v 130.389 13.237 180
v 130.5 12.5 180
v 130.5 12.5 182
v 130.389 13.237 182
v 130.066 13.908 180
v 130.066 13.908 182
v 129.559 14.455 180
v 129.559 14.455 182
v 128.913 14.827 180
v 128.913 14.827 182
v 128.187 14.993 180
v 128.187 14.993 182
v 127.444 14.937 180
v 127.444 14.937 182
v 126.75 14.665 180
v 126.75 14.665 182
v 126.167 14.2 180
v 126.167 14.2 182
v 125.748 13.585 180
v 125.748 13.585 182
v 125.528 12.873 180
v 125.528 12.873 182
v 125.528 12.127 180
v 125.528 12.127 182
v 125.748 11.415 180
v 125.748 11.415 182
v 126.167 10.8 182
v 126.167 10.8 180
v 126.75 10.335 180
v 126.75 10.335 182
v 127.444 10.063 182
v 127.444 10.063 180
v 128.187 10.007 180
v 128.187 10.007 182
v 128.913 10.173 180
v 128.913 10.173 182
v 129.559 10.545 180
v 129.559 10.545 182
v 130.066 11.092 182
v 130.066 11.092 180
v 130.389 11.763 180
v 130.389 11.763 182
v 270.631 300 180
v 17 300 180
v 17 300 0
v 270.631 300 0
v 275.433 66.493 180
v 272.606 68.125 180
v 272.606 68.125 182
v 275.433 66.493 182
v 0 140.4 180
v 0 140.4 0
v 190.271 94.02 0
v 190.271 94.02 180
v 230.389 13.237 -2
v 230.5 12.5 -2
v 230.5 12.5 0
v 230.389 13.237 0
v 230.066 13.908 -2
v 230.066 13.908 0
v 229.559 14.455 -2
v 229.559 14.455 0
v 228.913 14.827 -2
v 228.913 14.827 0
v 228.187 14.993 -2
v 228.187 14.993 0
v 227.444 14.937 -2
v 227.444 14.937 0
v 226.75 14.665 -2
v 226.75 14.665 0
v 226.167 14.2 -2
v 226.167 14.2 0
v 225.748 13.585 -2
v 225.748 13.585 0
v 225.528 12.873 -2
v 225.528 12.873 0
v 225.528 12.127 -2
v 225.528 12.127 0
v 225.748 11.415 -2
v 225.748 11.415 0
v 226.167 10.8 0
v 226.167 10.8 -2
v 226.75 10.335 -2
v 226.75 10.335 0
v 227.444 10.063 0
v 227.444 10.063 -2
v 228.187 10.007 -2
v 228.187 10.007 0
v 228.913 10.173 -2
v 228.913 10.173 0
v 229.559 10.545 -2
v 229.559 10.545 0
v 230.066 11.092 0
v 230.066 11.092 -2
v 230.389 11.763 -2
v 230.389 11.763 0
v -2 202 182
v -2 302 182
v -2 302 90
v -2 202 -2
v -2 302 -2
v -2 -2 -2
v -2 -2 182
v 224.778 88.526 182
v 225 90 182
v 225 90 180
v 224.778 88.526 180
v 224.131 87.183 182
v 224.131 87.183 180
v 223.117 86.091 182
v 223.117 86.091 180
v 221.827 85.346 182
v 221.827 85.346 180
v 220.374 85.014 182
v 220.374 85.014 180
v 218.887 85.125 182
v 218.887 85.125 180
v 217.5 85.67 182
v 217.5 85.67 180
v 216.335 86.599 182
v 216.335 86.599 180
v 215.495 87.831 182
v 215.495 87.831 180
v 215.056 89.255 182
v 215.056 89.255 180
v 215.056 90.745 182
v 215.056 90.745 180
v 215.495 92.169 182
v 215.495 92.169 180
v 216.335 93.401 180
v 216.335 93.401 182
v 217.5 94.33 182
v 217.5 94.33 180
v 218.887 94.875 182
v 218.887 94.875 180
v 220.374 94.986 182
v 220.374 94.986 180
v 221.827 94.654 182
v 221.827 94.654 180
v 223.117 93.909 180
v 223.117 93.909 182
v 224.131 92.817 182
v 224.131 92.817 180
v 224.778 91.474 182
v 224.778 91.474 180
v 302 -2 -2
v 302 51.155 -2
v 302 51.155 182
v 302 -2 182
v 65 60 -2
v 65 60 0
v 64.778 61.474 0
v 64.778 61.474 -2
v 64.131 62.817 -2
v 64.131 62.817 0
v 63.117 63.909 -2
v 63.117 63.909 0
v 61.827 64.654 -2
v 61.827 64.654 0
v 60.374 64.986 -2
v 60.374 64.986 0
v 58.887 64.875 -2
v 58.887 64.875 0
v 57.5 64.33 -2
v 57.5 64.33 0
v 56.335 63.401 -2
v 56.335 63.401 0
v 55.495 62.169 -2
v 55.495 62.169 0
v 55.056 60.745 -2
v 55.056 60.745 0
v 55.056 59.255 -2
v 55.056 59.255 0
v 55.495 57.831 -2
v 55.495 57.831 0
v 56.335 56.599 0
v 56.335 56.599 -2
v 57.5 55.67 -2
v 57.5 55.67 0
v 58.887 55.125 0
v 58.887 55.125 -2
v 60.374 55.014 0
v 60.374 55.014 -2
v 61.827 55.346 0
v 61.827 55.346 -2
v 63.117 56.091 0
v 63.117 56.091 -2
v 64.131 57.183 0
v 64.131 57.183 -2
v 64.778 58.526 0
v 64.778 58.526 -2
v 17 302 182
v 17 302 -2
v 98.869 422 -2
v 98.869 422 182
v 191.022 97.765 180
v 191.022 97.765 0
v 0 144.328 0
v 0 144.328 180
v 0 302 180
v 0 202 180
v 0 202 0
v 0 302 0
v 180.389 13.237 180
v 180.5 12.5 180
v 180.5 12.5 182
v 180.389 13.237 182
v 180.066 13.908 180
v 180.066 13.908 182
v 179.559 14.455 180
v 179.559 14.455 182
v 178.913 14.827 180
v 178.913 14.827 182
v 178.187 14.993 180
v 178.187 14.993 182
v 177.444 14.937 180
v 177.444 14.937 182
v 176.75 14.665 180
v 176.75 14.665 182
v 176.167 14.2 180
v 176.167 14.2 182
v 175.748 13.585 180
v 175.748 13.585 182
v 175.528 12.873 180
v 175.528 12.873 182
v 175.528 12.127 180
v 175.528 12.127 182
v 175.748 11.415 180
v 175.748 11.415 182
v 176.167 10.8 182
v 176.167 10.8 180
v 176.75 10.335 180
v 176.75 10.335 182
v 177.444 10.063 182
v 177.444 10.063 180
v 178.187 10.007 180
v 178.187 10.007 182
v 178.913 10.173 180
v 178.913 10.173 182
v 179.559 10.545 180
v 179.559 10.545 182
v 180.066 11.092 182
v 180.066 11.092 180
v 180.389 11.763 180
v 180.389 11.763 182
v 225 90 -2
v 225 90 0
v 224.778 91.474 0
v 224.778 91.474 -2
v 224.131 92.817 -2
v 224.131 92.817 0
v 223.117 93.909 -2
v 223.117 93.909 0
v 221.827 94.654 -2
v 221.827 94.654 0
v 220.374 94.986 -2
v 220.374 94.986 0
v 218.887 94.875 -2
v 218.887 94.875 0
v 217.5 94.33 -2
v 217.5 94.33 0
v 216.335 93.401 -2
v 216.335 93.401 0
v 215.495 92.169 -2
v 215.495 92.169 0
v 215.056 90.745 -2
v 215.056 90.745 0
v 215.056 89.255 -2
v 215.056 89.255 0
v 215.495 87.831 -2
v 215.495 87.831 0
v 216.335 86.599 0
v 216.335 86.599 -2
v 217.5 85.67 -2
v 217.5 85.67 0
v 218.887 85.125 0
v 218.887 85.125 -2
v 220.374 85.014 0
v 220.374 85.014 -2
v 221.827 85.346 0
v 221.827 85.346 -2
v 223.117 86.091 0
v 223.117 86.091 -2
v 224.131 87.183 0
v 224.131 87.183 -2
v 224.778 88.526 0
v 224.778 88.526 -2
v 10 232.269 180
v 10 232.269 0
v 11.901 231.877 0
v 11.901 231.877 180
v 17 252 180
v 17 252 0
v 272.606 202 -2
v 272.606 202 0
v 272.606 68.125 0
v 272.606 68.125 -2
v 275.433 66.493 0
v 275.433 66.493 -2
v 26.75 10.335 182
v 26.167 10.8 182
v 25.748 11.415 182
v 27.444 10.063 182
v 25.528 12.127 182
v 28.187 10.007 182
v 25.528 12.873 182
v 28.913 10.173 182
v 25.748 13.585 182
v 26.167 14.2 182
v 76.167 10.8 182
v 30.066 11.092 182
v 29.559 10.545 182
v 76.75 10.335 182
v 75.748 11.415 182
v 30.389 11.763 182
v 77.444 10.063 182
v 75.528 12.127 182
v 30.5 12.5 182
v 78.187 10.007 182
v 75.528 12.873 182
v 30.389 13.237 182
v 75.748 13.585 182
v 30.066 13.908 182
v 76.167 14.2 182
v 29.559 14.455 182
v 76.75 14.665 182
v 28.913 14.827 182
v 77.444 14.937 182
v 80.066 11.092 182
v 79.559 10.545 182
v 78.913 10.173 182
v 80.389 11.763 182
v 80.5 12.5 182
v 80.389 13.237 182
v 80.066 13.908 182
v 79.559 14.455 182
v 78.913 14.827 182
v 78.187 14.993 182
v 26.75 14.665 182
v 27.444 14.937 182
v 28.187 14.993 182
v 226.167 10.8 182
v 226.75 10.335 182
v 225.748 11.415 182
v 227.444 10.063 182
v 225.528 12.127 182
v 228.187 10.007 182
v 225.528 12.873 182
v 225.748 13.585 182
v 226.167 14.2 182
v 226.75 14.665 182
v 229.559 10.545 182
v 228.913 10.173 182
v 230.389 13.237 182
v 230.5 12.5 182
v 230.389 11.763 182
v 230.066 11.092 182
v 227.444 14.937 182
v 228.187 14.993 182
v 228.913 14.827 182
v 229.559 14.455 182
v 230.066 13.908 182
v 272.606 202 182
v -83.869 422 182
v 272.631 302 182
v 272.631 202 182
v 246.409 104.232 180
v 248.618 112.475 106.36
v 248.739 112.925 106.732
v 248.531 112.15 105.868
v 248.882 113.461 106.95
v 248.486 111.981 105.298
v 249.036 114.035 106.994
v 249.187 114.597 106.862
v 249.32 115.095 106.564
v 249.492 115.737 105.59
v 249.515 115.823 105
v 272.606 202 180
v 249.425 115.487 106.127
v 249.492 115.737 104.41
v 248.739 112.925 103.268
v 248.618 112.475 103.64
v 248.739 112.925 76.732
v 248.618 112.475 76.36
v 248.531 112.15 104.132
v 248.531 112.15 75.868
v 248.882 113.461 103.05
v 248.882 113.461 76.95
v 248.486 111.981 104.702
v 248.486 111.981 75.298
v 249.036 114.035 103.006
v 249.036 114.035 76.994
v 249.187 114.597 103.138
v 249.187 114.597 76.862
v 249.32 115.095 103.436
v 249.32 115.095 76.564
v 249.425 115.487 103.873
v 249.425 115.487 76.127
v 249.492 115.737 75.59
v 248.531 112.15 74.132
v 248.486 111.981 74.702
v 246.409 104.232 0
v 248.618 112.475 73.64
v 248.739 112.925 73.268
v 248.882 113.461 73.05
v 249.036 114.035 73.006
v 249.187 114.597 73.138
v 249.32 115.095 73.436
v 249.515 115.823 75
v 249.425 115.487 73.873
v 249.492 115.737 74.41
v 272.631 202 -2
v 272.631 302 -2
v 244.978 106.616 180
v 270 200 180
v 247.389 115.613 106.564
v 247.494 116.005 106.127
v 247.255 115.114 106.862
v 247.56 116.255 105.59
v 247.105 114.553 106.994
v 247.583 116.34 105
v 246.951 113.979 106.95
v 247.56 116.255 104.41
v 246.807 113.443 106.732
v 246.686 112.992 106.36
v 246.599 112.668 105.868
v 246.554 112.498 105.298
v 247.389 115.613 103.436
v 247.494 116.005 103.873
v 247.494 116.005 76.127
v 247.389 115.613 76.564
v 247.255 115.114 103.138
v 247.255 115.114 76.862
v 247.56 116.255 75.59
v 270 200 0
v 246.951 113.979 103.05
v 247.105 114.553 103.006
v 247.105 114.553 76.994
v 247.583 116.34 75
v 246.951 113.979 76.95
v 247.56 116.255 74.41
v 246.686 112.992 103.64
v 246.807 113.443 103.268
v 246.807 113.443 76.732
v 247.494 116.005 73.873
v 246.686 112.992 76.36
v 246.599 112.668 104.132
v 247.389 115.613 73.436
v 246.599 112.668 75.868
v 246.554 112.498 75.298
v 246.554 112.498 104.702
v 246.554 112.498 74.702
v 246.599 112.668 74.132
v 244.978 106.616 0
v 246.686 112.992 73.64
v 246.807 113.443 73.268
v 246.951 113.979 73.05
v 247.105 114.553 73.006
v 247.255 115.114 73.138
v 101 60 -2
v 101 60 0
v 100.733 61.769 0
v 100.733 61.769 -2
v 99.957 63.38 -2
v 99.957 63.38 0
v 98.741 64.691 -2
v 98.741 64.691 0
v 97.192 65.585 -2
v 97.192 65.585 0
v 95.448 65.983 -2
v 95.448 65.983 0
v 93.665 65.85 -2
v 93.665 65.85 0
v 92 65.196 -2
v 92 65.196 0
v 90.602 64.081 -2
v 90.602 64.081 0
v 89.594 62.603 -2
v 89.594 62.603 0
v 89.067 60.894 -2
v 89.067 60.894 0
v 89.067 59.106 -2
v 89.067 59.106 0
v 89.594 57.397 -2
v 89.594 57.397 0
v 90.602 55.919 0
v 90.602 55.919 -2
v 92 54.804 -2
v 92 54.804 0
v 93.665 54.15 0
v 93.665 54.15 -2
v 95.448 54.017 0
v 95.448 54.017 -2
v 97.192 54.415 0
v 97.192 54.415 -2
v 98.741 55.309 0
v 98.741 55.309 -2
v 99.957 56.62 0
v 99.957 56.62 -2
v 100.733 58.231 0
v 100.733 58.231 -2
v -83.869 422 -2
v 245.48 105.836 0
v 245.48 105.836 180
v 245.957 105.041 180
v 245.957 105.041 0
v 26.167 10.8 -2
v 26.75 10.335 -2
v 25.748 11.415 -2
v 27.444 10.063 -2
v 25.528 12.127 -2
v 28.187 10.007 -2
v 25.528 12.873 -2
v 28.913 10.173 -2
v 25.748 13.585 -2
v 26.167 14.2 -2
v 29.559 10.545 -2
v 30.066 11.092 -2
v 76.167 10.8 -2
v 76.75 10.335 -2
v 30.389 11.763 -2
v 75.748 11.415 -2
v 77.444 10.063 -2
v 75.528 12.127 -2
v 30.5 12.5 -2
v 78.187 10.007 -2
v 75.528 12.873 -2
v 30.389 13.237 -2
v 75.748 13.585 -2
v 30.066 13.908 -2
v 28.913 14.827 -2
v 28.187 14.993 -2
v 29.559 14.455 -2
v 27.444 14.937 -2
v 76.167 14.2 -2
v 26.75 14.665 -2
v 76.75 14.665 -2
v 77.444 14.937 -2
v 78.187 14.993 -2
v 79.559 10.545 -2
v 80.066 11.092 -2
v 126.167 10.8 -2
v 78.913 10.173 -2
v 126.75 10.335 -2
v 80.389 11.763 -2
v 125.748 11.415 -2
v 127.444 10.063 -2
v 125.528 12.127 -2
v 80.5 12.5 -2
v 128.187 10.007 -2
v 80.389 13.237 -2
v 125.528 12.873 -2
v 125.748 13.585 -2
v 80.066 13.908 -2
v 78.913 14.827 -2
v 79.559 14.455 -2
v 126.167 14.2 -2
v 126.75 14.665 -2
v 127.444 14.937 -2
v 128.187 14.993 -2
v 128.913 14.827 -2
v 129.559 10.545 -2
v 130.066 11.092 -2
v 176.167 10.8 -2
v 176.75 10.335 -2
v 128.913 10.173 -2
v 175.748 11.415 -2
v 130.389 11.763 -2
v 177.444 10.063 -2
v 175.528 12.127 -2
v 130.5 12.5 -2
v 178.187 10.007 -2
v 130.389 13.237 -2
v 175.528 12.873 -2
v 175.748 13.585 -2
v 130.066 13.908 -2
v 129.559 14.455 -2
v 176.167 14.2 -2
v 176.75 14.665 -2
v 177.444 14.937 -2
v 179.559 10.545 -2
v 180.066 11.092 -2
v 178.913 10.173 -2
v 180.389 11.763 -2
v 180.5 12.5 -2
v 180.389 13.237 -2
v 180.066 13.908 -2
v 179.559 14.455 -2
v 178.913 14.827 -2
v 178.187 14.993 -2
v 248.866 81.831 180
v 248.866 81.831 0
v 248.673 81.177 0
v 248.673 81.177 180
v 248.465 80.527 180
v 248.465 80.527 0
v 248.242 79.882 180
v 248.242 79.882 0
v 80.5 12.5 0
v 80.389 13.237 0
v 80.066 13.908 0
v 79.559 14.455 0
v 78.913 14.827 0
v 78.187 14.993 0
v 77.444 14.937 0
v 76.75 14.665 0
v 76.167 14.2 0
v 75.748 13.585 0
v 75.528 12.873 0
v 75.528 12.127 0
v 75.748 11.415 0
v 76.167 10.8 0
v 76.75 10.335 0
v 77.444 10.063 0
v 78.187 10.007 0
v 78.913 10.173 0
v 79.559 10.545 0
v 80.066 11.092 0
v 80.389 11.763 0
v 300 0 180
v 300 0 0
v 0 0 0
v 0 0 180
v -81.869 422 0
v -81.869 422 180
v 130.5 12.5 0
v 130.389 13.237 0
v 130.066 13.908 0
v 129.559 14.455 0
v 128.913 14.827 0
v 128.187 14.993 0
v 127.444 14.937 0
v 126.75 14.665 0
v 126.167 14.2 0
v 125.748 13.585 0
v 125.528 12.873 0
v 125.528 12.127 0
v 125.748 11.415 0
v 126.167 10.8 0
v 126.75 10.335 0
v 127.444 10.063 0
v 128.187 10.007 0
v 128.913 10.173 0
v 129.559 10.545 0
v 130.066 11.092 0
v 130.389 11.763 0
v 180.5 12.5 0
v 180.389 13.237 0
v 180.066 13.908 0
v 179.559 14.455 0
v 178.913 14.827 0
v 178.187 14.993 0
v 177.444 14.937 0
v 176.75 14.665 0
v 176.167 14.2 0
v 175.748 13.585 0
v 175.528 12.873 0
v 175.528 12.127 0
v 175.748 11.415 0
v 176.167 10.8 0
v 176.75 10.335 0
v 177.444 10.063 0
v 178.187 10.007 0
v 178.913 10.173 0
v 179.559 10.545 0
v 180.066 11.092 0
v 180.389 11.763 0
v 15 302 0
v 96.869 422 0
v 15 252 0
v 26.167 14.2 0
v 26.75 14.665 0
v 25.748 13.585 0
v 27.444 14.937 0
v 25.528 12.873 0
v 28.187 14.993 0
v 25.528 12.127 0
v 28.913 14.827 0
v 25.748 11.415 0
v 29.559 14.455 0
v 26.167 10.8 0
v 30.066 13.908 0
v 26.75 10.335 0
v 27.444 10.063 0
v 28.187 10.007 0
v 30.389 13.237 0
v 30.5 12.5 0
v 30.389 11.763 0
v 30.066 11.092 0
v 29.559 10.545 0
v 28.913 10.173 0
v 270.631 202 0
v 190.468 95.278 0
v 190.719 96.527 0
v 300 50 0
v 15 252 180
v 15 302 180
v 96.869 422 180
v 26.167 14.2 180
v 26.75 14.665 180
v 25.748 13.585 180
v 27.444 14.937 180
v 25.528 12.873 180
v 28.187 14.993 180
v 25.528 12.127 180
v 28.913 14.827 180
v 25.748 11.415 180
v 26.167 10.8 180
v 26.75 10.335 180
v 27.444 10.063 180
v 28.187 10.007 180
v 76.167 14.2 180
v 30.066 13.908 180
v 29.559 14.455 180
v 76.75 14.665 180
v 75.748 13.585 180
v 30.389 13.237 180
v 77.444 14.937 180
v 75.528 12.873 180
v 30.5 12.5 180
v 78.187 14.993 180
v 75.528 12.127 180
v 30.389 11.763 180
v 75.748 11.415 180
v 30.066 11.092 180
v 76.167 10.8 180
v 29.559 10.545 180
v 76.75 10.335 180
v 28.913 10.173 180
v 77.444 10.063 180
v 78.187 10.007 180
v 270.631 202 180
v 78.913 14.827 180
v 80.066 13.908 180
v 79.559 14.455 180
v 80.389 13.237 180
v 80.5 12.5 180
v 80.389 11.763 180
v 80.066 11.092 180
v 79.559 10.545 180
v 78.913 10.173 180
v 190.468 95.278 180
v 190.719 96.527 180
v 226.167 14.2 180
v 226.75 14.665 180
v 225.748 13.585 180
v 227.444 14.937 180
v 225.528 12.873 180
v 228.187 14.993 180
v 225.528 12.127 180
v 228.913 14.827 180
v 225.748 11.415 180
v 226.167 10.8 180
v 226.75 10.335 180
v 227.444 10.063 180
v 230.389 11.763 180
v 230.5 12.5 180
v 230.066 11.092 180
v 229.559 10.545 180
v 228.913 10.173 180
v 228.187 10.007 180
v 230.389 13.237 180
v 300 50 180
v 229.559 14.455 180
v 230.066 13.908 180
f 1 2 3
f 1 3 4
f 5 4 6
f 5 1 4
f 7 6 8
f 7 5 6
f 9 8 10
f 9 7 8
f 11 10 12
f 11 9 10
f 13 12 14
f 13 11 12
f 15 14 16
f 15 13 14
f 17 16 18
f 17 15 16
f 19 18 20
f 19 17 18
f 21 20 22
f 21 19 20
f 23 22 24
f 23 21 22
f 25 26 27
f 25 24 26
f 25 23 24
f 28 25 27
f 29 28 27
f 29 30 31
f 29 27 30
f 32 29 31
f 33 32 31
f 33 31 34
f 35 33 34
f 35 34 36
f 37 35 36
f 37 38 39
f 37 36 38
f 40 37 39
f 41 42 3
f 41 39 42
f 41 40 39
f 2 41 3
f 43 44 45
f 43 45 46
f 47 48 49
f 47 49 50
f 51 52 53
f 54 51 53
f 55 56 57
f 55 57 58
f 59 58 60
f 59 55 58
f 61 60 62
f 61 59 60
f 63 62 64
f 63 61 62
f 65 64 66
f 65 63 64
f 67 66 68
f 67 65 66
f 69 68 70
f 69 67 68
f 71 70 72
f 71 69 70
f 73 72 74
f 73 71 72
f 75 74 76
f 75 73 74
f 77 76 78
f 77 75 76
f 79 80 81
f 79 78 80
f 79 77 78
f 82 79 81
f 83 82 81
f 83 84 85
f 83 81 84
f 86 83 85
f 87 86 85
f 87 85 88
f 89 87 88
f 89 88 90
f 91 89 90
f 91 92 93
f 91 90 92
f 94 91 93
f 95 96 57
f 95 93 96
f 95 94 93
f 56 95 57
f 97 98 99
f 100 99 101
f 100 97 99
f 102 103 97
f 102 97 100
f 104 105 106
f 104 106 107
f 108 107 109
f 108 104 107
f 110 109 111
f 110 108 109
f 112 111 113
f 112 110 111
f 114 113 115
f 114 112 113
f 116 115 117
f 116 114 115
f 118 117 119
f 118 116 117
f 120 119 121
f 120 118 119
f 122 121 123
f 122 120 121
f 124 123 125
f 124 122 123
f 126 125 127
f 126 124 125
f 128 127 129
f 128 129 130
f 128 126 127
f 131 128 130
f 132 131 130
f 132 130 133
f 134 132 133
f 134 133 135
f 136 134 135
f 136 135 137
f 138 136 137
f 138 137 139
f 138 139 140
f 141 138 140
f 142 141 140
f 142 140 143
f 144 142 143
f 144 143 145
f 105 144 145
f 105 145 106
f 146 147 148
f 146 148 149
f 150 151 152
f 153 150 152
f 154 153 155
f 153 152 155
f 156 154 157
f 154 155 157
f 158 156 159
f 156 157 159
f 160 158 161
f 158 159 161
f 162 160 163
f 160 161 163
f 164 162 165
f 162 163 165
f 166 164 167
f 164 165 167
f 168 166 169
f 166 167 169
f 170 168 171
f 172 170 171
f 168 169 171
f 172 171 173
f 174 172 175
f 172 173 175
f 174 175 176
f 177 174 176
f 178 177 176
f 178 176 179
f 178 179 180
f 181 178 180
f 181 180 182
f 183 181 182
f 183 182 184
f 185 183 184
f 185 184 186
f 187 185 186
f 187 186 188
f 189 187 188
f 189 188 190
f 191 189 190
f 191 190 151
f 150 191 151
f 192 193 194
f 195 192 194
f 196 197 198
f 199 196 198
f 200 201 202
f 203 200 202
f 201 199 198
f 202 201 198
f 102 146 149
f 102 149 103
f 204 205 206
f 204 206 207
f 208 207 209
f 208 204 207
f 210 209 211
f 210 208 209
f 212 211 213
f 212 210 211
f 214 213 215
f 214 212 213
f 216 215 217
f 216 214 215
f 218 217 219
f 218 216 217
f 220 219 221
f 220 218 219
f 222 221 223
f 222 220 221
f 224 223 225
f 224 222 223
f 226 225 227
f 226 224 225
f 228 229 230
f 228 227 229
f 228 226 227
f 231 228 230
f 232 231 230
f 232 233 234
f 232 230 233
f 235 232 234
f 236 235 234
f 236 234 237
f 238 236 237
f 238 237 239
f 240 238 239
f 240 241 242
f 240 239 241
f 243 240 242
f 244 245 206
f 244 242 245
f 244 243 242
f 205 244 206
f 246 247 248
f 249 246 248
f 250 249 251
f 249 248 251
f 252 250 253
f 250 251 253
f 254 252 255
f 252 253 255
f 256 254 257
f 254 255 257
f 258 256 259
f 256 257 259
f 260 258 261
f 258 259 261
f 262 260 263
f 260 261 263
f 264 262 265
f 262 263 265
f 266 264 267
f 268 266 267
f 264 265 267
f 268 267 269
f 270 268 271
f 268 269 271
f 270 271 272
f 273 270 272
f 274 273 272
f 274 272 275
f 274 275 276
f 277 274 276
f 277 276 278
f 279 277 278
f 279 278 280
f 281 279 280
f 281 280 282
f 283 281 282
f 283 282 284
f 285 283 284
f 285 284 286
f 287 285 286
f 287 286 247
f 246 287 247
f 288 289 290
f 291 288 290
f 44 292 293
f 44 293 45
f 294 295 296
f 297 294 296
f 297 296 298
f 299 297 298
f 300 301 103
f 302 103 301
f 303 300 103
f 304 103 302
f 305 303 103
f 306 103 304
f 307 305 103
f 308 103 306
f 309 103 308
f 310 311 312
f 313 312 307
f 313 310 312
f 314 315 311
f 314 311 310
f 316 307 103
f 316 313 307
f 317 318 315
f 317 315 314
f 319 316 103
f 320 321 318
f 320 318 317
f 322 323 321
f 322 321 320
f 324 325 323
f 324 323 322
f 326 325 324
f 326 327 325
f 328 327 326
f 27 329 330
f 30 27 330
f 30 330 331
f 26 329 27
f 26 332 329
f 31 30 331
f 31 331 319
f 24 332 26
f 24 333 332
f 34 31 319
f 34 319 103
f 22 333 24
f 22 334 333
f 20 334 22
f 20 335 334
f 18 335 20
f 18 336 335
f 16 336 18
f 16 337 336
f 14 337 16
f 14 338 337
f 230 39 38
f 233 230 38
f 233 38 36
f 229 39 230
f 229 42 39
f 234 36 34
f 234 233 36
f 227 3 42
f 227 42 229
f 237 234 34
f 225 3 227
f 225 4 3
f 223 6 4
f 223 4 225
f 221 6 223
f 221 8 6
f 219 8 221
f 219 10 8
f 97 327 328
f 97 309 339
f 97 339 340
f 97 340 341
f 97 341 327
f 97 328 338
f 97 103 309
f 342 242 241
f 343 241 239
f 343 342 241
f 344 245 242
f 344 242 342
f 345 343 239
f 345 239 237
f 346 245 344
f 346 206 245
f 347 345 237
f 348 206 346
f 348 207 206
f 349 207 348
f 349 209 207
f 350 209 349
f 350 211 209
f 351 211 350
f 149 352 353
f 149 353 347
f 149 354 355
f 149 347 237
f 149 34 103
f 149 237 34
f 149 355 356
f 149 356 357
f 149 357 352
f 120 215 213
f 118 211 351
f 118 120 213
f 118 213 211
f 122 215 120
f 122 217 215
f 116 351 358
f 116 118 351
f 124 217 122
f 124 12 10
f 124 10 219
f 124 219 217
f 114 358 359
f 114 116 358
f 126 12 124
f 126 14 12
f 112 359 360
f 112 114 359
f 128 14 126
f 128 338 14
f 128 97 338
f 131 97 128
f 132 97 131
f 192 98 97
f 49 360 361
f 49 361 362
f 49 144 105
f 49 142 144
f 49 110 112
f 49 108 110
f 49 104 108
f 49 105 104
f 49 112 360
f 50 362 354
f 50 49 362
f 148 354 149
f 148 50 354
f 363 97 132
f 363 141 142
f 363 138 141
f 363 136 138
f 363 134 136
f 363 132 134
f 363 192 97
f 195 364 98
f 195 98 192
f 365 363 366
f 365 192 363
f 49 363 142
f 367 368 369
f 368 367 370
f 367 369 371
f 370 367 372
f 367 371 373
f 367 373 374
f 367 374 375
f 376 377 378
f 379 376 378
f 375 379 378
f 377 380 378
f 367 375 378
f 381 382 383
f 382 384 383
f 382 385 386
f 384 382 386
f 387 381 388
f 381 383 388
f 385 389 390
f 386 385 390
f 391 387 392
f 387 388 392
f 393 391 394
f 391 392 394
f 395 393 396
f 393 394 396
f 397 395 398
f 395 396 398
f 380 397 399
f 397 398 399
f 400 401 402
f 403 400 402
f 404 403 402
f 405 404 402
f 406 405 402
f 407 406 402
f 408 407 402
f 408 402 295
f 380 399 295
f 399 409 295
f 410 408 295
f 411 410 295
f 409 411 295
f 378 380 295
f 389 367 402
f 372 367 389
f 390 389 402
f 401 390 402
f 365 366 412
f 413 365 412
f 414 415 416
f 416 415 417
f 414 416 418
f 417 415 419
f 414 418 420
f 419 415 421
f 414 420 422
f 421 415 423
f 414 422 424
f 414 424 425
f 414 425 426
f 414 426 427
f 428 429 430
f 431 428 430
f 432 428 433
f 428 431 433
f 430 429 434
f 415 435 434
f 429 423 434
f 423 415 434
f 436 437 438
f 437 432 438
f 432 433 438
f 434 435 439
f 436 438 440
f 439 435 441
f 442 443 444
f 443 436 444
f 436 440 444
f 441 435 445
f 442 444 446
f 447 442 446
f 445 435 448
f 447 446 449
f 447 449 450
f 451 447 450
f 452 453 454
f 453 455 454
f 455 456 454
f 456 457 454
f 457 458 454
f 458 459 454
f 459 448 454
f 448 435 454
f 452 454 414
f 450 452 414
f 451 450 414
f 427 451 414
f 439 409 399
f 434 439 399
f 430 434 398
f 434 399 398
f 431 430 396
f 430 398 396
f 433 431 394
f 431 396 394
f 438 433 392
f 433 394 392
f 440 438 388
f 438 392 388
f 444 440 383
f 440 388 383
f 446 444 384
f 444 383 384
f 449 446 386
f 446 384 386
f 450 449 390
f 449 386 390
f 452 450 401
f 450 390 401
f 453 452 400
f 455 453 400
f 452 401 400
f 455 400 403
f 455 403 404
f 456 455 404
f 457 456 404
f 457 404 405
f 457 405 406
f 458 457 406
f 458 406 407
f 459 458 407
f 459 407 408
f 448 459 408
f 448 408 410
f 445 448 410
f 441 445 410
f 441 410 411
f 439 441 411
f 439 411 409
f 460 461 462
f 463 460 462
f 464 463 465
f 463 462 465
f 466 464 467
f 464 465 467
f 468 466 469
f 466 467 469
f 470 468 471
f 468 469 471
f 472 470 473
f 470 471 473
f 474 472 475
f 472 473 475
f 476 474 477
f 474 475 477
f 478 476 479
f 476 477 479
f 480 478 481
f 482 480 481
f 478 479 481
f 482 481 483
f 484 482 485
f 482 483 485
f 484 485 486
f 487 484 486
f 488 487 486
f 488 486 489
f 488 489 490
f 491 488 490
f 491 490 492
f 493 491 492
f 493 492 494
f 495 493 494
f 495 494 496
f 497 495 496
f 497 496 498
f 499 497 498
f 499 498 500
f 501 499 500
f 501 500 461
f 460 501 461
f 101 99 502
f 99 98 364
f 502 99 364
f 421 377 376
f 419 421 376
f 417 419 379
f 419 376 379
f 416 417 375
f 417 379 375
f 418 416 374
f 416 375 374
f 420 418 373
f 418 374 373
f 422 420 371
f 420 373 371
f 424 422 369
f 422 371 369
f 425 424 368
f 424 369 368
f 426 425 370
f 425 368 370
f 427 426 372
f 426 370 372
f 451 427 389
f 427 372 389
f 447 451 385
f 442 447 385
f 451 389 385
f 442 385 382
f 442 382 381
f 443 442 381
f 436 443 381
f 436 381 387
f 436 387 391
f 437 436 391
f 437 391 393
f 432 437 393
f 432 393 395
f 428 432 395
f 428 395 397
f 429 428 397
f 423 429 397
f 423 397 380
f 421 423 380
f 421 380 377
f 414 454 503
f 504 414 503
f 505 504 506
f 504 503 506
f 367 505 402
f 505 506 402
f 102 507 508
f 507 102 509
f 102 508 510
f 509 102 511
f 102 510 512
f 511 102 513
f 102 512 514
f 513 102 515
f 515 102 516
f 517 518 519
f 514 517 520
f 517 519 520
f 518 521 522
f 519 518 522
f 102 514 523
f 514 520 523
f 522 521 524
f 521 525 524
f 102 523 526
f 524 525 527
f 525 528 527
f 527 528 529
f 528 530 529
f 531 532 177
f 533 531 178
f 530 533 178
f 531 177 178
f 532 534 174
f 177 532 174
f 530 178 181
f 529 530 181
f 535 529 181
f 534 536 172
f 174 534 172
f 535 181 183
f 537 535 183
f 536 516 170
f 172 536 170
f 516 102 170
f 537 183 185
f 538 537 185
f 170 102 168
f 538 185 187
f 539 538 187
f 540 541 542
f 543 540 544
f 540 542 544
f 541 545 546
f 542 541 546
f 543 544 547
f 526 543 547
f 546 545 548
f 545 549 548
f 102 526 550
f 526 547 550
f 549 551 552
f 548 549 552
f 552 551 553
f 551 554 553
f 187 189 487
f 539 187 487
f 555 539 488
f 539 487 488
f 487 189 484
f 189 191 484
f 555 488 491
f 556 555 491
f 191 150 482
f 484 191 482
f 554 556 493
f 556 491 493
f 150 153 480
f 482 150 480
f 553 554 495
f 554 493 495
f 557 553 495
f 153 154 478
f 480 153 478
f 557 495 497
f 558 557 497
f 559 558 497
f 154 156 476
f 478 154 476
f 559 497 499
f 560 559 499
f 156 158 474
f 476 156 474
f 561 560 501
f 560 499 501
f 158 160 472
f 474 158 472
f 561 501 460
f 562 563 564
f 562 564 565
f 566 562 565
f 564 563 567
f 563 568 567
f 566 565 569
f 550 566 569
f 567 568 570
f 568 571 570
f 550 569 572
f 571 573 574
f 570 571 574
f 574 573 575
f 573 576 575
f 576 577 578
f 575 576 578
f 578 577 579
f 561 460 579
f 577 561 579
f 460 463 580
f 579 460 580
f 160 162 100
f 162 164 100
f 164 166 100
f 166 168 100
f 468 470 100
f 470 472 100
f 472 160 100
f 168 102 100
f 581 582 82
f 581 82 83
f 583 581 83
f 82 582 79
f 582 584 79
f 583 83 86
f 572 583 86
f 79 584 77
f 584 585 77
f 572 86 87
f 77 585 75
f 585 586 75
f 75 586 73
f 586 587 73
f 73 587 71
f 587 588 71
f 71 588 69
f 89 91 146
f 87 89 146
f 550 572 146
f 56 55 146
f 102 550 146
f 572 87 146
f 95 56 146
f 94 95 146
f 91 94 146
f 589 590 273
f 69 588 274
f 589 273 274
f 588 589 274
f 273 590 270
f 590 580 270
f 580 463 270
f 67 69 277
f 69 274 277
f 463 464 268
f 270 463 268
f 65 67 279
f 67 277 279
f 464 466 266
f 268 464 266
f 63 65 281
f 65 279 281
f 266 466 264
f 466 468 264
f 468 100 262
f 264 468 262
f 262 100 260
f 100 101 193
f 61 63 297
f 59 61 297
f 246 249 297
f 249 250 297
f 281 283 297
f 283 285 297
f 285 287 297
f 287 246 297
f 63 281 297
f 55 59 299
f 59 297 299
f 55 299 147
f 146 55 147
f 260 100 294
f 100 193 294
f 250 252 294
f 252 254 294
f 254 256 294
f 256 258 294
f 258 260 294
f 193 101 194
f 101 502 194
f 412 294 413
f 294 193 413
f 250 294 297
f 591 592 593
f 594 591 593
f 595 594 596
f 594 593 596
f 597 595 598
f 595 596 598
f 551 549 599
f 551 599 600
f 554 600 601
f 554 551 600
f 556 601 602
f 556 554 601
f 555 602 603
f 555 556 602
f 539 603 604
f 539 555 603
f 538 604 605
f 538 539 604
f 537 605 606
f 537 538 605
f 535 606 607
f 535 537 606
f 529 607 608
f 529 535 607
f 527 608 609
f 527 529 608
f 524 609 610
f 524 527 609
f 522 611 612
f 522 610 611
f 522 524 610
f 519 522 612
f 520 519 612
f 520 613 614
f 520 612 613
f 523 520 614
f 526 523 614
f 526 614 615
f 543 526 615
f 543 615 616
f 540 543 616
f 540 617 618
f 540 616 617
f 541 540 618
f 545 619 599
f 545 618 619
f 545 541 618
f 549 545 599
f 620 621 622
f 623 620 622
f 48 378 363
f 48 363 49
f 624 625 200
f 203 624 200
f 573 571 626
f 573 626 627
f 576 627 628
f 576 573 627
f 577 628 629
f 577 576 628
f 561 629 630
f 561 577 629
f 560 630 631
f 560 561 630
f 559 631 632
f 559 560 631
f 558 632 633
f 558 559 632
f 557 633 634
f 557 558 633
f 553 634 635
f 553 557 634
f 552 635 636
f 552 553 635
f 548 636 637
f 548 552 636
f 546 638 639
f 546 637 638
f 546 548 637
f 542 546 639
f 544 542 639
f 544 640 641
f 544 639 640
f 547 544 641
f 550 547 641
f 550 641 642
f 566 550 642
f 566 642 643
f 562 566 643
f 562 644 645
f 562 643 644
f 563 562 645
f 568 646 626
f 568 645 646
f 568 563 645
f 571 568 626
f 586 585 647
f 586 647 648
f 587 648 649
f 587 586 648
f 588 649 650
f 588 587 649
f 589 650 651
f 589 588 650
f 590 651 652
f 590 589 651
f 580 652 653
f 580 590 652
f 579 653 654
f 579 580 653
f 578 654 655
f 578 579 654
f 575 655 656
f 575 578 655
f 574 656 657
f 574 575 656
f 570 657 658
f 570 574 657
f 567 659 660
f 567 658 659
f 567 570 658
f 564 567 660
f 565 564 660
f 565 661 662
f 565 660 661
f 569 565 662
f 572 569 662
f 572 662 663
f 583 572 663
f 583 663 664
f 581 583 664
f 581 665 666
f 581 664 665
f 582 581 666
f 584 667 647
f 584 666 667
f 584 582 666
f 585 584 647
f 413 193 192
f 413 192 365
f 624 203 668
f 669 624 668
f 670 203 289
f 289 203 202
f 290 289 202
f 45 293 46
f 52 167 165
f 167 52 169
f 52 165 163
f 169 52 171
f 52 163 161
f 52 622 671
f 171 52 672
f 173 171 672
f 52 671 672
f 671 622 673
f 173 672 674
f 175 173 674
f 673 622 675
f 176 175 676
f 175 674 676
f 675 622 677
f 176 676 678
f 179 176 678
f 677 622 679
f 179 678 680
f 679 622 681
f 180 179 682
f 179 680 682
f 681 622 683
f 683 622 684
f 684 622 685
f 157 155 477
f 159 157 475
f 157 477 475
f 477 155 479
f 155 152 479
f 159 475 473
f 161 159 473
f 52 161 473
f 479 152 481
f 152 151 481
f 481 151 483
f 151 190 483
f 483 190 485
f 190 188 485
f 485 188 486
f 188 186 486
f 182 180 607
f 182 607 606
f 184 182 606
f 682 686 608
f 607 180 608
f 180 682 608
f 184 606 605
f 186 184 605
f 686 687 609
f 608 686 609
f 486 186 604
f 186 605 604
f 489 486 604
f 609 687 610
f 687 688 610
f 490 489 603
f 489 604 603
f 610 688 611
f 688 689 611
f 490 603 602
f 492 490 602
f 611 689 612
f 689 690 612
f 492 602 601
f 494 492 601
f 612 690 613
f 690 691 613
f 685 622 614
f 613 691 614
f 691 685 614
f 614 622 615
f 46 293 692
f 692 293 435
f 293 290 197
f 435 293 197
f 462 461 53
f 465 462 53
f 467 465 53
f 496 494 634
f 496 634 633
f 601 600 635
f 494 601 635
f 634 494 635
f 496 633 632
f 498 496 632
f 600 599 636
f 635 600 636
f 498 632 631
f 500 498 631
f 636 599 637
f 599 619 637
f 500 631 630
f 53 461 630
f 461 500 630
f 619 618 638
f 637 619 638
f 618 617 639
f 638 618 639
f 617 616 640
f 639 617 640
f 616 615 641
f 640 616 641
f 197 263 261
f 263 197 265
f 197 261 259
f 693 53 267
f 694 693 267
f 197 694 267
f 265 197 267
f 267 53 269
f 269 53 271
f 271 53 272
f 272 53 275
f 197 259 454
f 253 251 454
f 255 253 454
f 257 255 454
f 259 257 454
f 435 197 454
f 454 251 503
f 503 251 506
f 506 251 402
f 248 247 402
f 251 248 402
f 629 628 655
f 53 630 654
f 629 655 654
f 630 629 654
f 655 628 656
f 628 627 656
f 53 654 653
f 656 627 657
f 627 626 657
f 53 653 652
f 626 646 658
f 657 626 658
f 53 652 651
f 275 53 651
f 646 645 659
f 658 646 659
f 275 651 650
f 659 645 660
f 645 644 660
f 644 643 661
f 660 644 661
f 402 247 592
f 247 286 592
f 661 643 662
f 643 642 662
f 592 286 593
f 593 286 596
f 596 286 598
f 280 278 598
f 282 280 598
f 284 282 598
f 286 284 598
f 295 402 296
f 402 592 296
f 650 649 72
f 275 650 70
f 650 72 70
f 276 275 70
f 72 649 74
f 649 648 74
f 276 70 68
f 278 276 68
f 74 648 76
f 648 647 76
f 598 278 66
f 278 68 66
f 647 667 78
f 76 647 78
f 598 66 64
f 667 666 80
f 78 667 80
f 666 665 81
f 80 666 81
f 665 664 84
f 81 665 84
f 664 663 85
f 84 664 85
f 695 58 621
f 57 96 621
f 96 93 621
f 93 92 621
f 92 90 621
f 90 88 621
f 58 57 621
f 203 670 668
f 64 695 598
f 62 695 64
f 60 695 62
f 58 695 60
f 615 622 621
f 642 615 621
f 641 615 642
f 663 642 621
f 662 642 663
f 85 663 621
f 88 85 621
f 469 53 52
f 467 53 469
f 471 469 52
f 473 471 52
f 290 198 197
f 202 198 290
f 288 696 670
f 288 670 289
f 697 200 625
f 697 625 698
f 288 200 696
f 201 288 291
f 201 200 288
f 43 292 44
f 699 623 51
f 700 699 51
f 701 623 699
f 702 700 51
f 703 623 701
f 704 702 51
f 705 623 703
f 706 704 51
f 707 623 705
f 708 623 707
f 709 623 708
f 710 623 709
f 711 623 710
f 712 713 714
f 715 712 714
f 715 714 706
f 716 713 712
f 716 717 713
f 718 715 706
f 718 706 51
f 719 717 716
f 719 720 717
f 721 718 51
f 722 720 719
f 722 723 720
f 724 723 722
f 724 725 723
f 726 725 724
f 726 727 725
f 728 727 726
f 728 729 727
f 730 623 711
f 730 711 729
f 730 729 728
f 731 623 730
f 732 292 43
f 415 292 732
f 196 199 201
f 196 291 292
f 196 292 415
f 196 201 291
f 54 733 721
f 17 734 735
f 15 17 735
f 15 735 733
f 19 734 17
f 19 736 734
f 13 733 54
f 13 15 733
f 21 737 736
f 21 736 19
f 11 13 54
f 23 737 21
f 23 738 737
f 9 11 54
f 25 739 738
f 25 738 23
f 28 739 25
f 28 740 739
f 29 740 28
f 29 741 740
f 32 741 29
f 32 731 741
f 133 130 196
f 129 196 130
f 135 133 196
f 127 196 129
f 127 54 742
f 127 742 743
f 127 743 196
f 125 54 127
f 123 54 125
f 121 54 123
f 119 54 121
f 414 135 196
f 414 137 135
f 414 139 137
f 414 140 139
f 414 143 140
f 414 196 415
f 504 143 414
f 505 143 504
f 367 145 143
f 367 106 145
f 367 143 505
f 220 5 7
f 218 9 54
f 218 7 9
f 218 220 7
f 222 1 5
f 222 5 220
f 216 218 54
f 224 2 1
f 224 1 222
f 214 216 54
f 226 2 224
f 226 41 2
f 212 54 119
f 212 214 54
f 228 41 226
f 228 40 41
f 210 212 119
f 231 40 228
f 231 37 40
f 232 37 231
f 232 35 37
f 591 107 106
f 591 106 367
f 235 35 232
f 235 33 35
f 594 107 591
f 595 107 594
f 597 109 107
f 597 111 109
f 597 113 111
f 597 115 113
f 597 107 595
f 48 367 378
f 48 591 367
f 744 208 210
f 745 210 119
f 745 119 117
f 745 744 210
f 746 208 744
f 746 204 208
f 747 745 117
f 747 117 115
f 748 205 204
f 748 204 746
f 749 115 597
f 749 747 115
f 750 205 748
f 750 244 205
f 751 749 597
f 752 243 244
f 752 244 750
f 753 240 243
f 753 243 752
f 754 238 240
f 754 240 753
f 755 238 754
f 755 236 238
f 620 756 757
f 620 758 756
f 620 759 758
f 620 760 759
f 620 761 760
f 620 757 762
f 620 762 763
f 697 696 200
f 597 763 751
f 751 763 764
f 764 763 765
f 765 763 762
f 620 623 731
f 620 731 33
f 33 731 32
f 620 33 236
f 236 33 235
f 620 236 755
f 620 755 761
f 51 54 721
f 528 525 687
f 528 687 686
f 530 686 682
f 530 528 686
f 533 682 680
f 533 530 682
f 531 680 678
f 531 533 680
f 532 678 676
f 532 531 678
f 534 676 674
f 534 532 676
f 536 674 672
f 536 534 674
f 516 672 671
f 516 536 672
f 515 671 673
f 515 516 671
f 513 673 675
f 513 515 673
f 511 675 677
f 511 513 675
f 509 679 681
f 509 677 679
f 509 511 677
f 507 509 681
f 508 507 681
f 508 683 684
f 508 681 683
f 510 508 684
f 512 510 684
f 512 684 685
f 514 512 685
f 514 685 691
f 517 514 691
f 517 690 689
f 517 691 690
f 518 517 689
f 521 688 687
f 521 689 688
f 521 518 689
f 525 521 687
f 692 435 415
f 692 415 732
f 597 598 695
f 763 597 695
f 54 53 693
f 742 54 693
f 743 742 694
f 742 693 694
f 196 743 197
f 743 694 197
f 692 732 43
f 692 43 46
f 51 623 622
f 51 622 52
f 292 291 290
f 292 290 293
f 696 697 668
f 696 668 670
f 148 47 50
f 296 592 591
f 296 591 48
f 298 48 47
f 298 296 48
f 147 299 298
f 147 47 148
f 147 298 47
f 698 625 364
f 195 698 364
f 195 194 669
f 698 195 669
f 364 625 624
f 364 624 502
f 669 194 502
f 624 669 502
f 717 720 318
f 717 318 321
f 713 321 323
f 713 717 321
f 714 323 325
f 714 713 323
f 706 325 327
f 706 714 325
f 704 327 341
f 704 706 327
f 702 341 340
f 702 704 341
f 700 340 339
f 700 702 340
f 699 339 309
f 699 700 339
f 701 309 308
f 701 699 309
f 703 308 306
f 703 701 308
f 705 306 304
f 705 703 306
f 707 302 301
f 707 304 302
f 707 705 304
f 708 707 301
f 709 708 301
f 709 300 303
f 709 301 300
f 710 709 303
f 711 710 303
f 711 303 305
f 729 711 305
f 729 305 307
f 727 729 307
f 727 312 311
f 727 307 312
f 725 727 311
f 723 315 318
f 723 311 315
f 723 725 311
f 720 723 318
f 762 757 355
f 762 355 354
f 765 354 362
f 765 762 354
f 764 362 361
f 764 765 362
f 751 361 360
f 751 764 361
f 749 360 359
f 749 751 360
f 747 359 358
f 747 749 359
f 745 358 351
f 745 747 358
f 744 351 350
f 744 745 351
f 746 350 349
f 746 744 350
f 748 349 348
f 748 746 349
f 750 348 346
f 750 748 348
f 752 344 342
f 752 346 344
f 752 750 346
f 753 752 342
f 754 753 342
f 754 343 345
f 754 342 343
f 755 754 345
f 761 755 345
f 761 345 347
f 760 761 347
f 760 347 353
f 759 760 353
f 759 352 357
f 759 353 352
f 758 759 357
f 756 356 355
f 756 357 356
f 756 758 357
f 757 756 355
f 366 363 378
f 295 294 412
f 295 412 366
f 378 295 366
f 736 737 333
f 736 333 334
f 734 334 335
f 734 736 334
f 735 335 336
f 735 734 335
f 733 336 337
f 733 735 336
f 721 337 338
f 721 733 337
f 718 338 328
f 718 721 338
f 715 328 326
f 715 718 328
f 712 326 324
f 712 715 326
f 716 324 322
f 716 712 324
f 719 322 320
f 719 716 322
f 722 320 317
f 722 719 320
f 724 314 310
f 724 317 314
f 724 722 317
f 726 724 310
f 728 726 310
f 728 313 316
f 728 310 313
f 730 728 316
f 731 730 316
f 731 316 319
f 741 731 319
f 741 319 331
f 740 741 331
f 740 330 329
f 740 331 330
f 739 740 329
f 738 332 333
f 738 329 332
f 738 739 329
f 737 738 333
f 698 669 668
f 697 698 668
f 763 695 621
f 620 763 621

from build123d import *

# Parameters (mm, degrees)
EXTRUDE_3_DEPTH           = 180
EXTRUDE_4_DEPTH           = 2
EXTRUDE_5_DEPTH           = 180
CUT_EXTRUDE_8_DEPTH       = 6
CUT_EXTRUDE_8_DEPTH_BACK  = 14
SKETCH_10_R               = 5
SKETCH_10_R_2             = 6
CUT_EXTRUDE_9_DEPTH       = 180
SKETCH_11_W               = 274.631033311
SKETCH_11_H               = 184
SKETCH_11_W_2             = 270.631033311
SKETCH_11_H_2             = 180
EXTRUDE_1_DEPTH           = 100
EXTRUDE_START             = -2
EXTRUDE_6_DEPTH           = 92
EXTRUDE_12_DEPTH          = 2
MIRROR_6_COPY_1_DEPTH     = 2
MIRROR_6_COPY_2_DEPTH     = 2
EXTRUDE_13_DEPTH          = 180
SKETCH_19_R               = 5
SKETCH_19_R_2             = 6
CUT_EXTRUDE_10_DEPTH      = 10
CUT_EXTRUDE_START         = -10
SKETCH_20_R               = 5
CUT_EXTRUDE_11_DEPTH      = 10
SKETCH_21_R               = 2
CUT_EXTRUDE_12_DEPTH      = 10
CUT_EXTRUDE_13_DEPTH      = 550.919994181
CUT_EXTRUDE_13_DEPTH_BACK = 550.919994181
SKETCH_22_R               = 2.5


with BuildPart() as part:
    # 草图1 → 凸台-拉伸3 (new body)
    with BuildSketch(Plane.XY):
        with BuildLine():
            Line((300, 0), (0, 0))
            Line((0, 0), (0, 200))
            Line((0, 200), (270, 200))
            Line((270, 200), (244.977927003, 106.616352266))
            ThreePointArc((244.977927003, 106.616352266), (245.721361032, 105.440582458), (246.409490454, 104.231613188))
            Line((246.409490454, 104.231613188), (272.606450746, 202))
            Line((272.606450746, 202), (-2, 202))
            Line((-2, 202), (-2, -2))
            Line((-2, -2), (302, -2))
            Line((302, -2), (302, 51.154700538))
            Line((302, 51.154700538), (248.866473036, 81.831356634))
            ThreePointArc((248.866473036, 81.831356634), (248.571049064, 80.851494363), (248.242374569, 79.882278975))
            Line((248.242374569, 79.882278975), (300, 50))
            Line((300, 50), (300, 0))
        make_face()
    extrude(amount=EXTRUDE_3_DEPTH)

    # 草图7 → 凸台-拉伸4 (add)
    with BuildSketch(Plane(origin=(0, 0, 0), x_dir=(-1, 0, 0), z_dir=(0, 0, -1))):
        Polygon((-272.606450746, 68.125074113), (-275.433236518, 66.493028586), (-302, 51.154700538), (-302, -2), (2, -2), (2, 202), (-272.606450746, 202), align=None)
    extrude_4 = extrude(amount=EXTRUDE_4_DEPTH)

    # 镜向5: 凸台-拉伸4 across plane
    add(extrude_4.mirror(Plane.XY.offset(90)))

    # 草图8 → 凸台-拉伸5 (add)
    with BuildSketch(Plane.XY):
        with BuildLine():
            Line((191.022225211, 97.764571353), (0, 144.327661976))
            Line((0, 144.327661976), (0, 140.399780569))
            Line((0, 140.399780569), (190.270548779, 94.019916677))
            ThreePointArc((190.270548779, 94.019916677), (190.586734182, 95.904218314), (191.022225211, 97.764571353))
        make_face()
    extrude(amount=EXTRUDE_5_DEPTH)

    # 草图10 → 切除-拉伸8 (cut, two sides: drawn at the far end of the back side and taken through both)
    with BuildSketch(Plane.XY.offset(-CUT_EXTRUDE_8_DEPTH_BACK)):
        with Locations(Location((60, 60, 0), (0, 0, 180))):
            Circle(SKETCH_10_R)
        with Locations(Location((95, 60, 0), (0, 0, 180))):
            Circle(SKETCH_10_R_2)
    extrude(amount=CUT_EXTRUDE_8_DEPTH + CUT_EXTRUDE_8_DEPTH_BACK, mode=Mode.SUBTRACT)

    # 草图8<3> → 切除-拉伸9 (cut)
    with BuildSketch(Plane.XY):
        Polygon((0, 200), (270, 200), (270.631033311, 202), (0, 202), align=None)
    extrude(amount=CUT_EXTRUDE_9_DEPTH, mode=Mode.SUBTRACT)

    # 草图11 → 拉伸-薄壁1 (add)
    with BuildSketch(Plane(origin=(0, 202, 0), x_dir=(1, 0, 0), z_dir=(0, 1, 0))):
        with Locations((135.315516656, -90)):
            Rectangle(SKETCH_11_W, SKETCH_11_H)
        with Locations((135.315516656, -90)):
            Rectangle(SKETCH_11_W_2, SKETCH_11_H_2, mode=Mode.SUBTRACT)
    extrude(amount=EXTRUDE_1_DEPTH)

    # 草图12 → 凸台-拉伸6 (add)
    with BuildSketch(Plane(origin=(0, 0, 180), x_dir=(-1, 0, 0), z_dir=(0, 0, -1)).offset(EXTRUDE_START)):
        Polygon((-98.869083806, 422), (-96.869083806, 422), (-15, 302), (-17, 302), align=None)
        Polygon((83.869083806, 422), (81.869083806, 422), (0, 302), (2, 302), align=None)
    extrude_6 = extrude(amount=EXTRUDE_6_DEPTH)

    # 草图16 → 凸台-拉伸12 (add)
    with BuildSketch(Plane.XY.offset(182)):
        Polygon((-83.869083806, 422), (98.869083806, 422), (17, 302), (-2, 302), align=None)
    extrude_12 = extrude(amount=-EXTRUDE_12_DEPTH)

    # 镜向6: 凸台-拉伸6 across plane
    add(extrude_6.mirror(Plane.XY.offset(90)))

    # 镜向6 copy 1 sketch → 镜向6 copy 1 (add)
    with BuildSketch(Plane(origin=(0, 0, 0), x_dir=(-1, 0, 0), z_dir=(0, 0, -1))):
        Polygon((-272.606450746, 68.125074113), (-275.433236518, 66.493028586), (-302, 51.154700538), (-302, -2), (2, -2), (2, 202), (-272.606450746, 202), align=None)
    extrude(amount=MIRROR_6_COPY_1_DEPTH)

    # 镜向6 copy 2 sketch → 镜向6 copy 2 (add)
    with BuildSketch(Plane(origin=(0, 0, 180), x_dir=(-1, 0, 0), z_dir=(0, 0, 1))):
        Polygon((-272.606450746, -68.125074113), (-275.433236518, -66.493028586), (-302, -51.154700538), (-302, 2), (2, 2), (2, -202), (-272.606450746, -202), align=None)
    extrude(amount=MIRROR_6_COPY_2_DEPTH)

    # 镜向7: 凸台-拉伸12 across plane
    add(extrude_12.mirror(Plane.XY.offset(90)))

    # 草图17 → 凸台-拉伸13 (add)
    with BuildSketch(Plane(origin=(0, 0, 180), x_dir=(-1, 0, 0), z_dir=(0, 0, -1))):
        Polygon((-15, 302), (-15, 252), (-10, 232.268619303), (-11.900860885, 231.877388977), (-17, 252), (-17, 300), (-270.631033311, 300), (-270.631033311, 302), (-17, 302), align=None)
    extrude(amount=EXTRUDE_13_DEPTH)

    # 草图19 → 切除-拉伸10 (cut)
    with BuildSketch(Plane.XY):
        with Locations((60, 60)):
            Circle(SKETCH_19_R)
        with Locations((95, 60)):
            Circle(SKETCH_19_R_2)
        with Locations((220, 90)):
            Circle(SKETCH_19_R)
    extrude(amount=-CUT_EXTRUDE_10_DEPTH, mode=Mode.SUBTRACT)

    # 草图20 → 切除-拉伸11 (cut)
    with BuildSketch(Plane(origin=(0, 0, 180), x_dir=(-1, 0, 0), z_dir=(0, 0, -1)).offset(CUT_EXTRUDE_START)):
        with Locations(Location((-220, 90, 0), (0, 0, 180))):
            Circle(SKETCH_20_R)
    extrude(amount=CUT_EXTRUDE_11_DEPTH, mode=Mode.SUBTRACT)

    # 草图21 → 切除-拉伸12 (cut)
    with BuildSketch(Plane(origin=(203.845281163, -54.620178469, 0), x_dir=(0, 0, -1), z_dir=(0.9659258262890673, -0.25881904510252457, 0))):
        with Locations(Location((-105, 174.455476118, 0), (0, 0, 90))):
            Circle(SKETCH_21_R)
        with Locations(Location((-75, 174.455476118, 0), (0, 0, 90))):
            Circle(SKETCH_21_R)
    extrude(amount=-CUT_EXTRUDE_12_DEPTH, mode=Mode.SUBTRACT)

    # 草图22 → 切除-拉伸13 (cut, two sides: drawn at the far end of the back side and taken through both)
    with BuildSketch(Plane.XY.offset(-CUT_EXTRUDE_13_DEPTH_BACK)):
        with Locations((28, 12.5)):
            Circle(SKETCH_22_R)
        with Locations((78, 12.5)):
            Circle(SKETCH_22_R)
        with Locations((128, 12.5)):
            Circle(SKETCH_22_R)
        with Locations((178, 12.5)):
            Circle(SKETCH_22_R)
        with Locations((228, 12.5)):
            Circle(SKETCH_22_R)
    extrude(amount=CUT_EXTRUDE_13_DEPTH + CUT_EXTRUDE_13_DEPTH_BACK, mode=Mode.SUBTRACT)


solid = part.part
